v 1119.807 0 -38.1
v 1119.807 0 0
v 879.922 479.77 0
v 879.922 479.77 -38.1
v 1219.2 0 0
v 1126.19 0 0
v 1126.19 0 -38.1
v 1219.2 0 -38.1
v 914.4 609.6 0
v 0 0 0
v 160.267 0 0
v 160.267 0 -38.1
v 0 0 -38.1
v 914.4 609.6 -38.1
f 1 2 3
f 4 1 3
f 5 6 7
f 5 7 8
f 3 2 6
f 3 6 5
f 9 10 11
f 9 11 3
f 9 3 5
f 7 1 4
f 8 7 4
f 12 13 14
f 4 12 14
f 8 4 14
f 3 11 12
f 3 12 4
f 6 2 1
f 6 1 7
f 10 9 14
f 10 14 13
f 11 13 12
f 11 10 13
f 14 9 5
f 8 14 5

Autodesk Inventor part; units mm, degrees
ref_plane "YZ Plane" through (0, 0, 0) normal (1, 0, 0) x (0, 1, 0)
ref_plane "XZ Plane" through (0, 0, 0) normal (0, 1, 0) x (-1, 0, 0)
ref_plane "XY Plane" through (0, 0, 0) normal (0, 0, 1) x (1, 0, 0)
sketch "Sketch1" plane through (0, 0, 0) normal (0, 0, 1) x (1, 0, 0)
  line L0 (0, 0) -> (0, -38.1) projected
  line L1 (0, -38.1) -> (1219.2, -38.1) projected
  line L2 (1219.2, 0) -> (1219.2, -38.1) projected
  line L3 (0, 0) -> (1219.2, 0) projected
  line L4 (0, 0) -> (914.4, 0)
  line L5 (914.4, 609.6) -> (0, 0)
  line L6 (914.4, 609.6) -> (1219.2, 0)
  line L7 (1219.2, 0) -> (1126.19, 0)
  line L8 (1119.8068, 0) -> (879.9218, 479.77)
  line L9 (1119.8068, 0) -> (1219.2, 0)
  line L10 (160.2668, 0) -> (879.9218, 479.77)
  dimension "d3" = 88.9
extrude "Extrusion1" add sketch "Sketch1" against normal blind 38.1 contours L5 L6 L3 L8 L10
properties part number "side1"
